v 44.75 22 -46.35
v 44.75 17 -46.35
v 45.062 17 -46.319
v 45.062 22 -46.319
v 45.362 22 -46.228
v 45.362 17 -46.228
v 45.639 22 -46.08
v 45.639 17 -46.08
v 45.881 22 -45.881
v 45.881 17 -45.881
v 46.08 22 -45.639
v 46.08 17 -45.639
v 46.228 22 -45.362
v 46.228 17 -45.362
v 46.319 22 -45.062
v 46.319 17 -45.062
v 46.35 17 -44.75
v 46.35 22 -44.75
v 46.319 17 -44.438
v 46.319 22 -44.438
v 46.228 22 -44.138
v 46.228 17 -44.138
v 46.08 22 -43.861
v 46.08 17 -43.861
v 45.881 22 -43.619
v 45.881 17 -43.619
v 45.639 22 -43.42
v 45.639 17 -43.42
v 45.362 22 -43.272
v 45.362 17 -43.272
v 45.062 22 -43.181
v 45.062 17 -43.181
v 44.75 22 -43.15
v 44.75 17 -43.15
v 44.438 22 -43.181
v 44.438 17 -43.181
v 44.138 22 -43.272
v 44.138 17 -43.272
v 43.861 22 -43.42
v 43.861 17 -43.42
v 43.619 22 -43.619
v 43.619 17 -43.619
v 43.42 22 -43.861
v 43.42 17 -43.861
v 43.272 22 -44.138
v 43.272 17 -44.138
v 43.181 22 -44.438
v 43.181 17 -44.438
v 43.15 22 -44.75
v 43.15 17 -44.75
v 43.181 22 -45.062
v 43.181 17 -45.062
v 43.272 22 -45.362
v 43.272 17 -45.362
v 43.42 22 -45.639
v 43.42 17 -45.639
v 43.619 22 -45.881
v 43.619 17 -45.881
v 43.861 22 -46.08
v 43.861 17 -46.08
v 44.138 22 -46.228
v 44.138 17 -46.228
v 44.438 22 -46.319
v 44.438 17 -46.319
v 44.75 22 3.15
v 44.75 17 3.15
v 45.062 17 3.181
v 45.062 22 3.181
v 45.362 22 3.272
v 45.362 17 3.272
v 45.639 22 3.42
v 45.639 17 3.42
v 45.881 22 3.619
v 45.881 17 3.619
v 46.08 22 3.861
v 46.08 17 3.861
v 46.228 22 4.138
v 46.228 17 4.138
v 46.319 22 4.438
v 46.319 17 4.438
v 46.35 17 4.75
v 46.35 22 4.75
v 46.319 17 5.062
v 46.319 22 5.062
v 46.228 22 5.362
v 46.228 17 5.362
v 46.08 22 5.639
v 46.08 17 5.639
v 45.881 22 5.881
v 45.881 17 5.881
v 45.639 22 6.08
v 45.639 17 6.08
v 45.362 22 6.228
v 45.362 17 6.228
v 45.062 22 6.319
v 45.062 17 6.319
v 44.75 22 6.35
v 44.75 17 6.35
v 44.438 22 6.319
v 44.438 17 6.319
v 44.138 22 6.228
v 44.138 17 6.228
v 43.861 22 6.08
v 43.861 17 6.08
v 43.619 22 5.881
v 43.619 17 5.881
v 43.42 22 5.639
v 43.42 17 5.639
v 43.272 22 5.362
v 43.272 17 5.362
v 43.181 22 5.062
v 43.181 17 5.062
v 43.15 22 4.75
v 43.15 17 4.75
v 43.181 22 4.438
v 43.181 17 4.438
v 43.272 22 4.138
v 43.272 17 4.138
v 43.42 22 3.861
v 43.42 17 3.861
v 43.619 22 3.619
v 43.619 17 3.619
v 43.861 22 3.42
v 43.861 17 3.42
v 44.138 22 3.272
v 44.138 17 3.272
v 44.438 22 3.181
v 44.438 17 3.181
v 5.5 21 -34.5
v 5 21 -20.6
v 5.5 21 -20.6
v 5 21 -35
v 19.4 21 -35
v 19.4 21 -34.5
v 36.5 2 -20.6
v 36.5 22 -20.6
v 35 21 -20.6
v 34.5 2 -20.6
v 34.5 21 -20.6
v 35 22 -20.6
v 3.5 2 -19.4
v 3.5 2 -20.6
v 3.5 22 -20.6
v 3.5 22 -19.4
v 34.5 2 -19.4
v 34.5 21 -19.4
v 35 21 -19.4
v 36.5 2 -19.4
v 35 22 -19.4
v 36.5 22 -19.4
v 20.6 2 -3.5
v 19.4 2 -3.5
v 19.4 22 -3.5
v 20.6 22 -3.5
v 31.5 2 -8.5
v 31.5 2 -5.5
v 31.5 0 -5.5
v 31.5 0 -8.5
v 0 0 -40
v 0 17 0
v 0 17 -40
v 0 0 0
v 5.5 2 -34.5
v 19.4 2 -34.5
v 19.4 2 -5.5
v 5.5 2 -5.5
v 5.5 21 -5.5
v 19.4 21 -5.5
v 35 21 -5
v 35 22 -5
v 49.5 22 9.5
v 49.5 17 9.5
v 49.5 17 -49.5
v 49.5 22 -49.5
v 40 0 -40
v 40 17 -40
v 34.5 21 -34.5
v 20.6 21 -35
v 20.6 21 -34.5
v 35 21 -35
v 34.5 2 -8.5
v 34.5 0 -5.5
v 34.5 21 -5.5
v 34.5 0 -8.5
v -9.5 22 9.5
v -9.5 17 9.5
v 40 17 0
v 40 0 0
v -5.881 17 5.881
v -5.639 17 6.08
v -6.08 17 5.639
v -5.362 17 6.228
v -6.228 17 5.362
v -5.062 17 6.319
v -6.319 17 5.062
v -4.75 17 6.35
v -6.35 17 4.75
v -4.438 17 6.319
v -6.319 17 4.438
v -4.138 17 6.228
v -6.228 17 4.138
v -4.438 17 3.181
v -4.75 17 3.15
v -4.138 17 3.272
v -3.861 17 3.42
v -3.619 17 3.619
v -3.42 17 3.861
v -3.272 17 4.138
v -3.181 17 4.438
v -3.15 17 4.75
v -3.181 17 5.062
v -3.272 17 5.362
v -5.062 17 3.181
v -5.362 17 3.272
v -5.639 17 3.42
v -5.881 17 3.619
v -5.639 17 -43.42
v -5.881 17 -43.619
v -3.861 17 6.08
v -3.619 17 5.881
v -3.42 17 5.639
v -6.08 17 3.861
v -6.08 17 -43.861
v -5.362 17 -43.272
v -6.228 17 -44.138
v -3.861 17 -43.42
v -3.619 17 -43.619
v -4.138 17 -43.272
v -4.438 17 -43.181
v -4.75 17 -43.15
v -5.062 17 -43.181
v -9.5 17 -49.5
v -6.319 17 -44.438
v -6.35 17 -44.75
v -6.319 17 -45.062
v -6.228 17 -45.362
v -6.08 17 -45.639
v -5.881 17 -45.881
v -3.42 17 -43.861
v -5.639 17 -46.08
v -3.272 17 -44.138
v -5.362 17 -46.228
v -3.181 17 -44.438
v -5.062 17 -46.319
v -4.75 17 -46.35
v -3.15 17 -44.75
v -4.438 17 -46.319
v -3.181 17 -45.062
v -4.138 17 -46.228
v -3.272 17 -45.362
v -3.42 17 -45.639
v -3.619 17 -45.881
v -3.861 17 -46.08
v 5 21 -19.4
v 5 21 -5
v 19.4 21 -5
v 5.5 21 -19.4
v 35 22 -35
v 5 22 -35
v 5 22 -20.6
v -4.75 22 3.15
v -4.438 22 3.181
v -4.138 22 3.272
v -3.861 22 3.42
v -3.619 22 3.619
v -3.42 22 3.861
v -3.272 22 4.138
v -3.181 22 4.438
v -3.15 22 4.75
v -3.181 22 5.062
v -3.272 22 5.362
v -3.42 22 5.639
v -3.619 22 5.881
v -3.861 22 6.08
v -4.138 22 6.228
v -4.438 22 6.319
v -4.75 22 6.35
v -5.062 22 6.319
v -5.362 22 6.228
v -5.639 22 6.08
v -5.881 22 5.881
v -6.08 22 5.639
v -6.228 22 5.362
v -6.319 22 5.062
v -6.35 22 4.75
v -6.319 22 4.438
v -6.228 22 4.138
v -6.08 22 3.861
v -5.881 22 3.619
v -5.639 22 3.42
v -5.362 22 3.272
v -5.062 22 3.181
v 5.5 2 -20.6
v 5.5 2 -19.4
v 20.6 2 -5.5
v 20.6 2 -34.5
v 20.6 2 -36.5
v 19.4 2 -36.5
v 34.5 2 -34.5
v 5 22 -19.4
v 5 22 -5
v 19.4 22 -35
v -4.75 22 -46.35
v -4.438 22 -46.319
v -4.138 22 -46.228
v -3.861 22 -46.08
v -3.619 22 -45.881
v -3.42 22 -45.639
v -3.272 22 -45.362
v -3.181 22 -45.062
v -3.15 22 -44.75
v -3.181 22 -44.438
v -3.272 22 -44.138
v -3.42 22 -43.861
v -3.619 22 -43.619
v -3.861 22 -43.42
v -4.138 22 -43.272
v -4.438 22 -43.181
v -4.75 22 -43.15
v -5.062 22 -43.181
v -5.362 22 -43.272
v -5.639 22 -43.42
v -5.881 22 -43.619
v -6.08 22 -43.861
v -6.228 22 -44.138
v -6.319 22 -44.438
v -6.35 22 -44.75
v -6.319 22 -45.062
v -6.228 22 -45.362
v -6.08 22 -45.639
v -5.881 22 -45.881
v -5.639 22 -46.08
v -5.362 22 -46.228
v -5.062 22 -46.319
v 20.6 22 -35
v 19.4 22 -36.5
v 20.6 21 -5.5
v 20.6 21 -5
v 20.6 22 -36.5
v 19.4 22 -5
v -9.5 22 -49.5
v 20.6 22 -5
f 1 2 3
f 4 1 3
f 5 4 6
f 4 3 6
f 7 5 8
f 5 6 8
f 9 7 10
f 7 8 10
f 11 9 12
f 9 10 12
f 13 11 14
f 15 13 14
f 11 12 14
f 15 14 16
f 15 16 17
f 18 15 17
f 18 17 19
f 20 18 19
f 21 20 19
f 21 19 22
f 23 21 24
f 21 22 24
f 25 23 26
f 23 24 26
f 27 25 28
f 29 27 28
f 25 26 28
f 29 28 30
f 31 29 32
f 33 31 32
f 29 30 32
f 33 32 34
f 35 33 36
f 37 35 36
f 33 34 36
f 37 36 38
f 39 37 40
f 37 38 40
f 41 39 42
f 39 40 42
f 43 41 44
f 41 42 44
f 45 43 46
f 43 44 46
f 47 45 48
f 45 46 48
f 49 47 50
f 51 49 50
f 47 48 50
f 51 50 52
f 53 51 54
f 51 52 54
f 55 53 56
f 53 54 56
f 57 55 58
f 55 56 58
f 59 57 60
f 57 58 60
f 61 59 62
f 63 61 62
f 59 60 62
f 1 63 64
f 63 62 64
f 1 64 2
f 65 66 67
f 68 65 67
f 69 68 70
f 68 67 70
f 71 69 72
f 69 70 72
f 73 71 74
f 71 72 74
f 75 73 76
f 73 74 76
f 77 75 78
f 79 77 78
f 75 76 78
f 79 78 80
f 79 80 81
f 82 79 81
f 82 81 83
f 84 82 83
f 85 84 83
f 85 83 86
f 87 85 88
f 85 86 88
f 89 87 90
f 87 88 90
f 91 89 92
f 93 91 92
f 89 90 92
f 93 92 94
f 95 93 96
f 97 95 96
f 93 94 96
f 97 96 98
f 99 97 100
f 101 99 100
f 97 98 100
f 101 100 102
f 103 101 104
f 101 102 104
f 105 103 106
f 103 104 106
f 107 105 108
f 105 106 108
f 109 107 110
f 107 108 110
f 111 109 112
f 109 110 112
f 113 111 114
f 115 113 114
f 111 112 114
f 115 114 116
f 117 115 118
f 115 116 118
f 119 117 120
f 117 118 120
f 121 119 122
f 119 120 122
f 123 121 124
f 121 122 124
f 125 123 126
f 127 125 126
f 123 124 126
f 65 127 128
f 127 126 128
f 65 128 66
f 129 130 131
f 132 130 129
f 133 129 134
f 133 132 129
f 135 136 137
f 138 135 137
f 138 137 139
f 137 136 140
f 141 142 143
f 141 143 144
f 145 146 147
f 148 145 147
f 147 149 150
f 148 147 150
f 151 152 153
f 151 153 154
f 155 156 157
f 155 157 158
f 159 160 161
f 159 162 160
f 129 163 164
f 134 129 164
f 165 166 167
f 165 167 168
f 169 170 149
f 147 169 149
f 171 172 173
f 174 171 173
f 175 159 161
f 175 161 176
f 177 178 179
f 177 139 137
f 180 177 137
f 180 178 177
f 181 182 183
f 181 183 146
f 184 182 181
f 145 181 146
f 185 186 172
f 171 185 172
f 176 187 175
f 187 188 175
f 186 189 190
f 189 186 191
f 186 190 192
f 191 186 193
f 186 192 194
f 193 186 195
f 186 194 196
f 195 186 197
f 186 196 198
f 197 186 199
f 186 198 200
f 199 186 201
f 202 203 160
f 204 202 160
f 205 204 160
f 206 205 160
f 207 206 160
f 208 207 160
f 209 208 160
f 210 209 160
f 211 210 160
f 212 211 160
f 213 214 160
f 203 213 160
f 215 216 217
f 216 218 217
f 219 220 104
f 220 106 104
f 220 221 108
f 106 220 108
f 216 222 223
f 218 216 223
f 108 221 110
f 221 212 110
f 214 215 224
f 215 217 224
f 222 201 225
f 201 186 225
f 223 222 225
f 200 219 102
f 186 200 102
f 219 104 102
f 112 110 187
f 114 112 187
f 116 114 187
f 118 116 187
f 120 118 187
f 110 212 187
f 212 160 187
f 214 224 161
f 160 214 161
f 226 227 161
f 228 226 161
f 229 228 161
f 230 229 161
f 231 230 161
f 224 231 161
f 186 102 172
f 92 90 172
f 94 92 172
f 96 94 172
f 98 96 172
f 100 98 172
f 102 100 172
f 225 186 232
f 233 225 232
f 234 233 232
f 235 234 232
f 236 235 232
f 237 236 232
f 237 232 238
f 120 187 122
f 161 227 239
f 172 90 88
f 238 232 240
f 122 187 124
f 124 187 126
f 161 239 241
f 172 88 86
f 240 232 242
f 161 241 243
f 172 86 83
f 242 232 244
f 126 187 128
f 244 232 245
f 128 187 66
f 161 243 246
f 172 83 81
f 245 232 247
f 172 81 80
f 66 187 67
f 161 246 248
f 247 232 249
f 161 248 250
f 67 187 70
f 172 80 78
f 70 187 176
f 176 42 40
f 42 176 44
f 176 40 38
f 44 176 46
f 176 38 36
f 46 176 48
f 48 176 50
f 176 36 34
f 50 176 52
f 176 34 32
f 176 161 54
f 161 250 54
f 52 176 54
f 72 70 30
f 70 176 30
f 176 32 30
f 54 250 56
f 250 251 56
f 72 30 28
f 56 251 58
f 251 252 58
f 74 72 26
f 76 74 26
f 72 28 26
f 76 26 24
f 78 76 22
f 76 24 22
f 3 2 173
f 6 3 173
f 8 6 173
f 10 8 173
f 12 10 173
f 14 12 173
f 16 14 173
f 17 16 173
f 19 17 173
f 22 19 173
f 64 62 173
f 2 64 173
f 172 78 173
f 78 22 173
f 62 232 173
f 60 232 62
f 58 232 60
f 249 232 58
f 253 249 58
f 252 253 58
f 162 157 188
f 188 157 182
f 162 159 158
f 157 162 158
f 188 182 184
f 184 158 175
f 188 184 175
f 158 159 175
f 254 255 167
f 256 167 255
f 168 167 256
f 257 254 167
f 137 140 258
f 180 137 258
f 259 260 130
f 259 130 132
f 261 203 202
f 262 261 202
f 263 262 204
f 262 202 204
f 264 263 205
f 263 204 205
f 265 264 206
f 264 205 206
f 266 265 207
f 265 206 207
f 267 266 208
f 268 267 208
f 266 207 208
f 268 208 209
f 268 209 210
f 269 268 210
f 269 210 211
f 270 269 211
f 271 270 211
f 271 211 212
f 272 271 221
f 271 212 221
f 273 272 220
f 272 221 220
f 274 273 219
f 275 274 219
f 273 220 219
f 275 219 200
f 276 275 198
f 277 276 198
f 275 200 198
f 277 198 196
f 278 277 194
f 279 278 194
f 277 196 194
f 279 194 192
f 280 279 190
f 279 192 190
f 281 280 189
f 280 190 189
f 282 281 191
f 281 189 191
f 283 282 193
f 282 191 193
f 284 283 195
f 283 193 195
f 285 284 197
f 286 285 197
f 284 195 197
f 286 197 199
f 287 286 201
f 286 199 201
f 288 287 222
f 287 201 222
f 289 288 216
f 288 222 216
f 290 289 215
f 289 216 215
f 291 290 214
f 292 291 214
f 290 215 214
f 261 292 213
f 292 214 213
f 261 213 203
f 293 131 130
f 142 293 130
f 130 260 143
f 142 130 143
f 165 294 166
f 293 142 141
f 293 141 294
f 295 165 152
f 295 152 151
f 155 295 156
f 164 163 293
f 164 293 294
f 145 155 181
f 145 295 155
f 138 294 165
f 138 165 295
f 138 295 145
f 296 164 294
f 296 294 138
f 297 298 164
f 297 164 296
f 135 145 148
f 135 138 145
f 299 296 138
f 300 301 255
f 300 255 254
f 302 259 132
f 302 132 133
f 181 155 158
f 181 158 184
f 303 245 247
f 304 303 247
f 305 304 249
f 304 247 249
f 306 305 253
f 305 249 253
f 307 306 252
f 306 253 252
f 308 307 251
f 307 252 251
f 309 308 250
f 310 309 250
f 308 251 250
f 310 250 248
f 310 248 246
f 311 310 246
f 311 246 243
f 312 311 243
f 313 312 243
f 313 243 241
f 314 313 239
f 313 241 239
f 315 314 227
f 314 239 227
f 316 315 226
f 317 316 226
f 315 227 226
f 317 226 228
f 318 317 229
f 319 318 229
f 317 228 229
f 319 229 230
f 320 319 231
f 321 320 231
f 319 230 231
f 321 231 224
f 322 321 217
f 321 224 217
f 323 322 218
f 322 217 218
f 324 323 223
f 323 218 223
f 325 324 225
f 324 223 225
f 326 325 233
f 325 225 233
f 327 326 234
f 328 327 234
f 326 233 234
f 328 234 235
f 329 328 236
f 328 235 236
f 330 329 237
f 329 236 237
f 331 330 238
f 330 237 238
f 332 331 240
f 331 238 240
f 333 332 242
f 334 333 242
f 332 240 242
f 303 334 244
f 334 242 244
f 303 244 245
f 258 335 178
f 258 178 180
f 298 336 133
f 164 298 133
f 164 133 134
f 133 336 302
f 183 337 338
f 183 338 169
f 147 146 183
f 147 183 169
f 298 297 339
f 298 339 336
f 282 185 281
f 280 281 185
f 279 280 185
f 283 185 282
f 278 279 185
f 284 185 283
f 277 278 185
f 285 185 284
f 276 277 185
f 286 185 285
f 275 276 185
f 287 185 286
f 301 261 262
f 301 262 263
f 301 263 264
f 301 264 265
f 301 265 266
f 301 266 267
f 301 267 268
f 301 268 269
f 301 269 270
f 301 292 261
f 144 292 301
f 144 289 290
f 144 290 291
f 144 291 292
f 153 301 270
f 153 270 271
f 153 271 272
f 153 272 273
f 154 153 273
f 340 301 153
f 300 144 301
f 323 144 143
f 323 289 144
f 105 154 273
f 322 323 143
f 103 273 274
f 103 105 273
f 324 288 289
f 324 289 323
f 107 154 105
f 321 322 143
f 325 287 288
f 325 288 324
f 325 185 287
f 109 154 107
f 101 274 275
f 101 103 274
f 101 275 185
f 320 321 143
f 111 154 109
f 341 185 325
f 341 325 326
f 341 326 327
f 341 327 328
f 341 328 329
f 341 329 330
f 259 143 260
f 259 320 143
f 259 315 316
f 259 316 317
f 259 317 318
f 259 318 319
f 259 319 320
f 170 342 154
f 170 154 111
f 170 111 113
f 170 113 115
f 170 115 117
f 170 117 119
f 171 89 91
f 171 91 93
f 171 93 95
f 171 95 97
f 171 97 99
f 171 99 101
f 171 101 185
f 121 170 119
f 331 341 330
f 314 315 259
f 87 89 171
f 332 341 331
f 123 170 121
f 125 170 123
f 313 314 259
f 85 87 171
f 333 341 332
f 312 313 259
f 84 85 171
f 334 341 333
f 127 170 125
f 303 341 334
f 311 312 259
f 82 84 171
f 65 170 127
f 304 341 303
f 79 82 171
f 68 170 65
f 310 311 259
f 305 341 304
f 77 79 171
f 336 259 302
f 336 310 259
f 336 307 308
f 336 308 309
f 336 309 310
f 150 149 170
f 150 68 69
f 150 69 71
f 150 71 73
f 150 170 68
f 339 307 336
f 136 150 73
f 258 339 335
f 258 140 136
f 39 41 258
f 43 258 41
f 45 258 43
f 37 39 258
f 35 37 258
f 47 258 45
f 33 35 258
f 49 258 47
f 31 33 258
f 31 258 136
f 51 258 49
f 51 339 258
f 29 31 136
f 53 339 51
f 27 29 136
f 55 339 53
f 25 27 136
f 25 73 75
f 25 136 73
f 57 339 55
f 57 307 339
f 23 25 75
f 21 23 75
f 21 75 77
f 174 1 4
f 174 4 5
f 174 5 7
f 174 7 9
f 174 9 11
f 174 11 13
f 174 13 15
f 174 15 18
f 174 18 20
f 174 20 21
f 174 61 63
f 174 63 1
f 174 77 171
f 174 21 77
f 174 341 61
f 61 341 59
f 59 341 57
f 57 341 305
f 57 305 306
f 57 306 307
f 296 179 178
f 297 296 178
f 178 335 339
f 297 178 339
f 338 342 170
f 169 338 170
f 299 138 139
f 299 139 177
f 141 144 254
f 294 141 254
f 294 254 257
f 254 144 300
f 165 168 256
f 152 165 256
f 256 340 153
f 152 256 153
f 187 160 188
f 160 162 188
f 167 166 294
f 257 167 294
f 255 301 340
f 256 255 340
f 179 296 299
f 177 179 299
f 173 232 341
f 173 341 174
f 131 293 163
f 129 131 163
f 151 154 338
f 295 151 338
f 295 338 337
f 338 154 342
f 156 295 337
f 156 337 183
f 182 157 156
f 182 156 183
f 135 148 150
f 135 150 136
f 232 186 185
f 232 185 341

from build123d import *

# Parameters (mm, degrees)
CROQUIS1_W              = 40
CROQUIS1_H              = 40
SALIENTE_EXTRUIR1_DEPTH = 2
CROQUIS2_W              = 40
CROQUIS2_H              = 40
CROQUIS2_W_2            = 29
CROQUIS2_H_2            = 29
SALIENTE_EXTRUIR2_DEPTH = 15
CROQUIS3_W              = 59
CROQUIS3_H              = 59
CROQUIS3_W_2            = 29
CROQUIS3_H_2            = 29
SALIENTE_EXTRUIR3_DEPTH = 5
CORTAR_EXTRUIR1_DEPTH   = 20
CROQUIS5_R              = 1.6
CORTAR_EXTRUIR2_DEPTH   = 5
CROQUIS6_W              = 30
CROQUIS6_H              = 30
CORTAR_EXTRUIR3_DEPTH   = 1
CROQUIS7_W              = 3
CROQUIS7_H              = 3
CORTAR_EXTRUIR4_DEPTH   = 5


with BuildPart() as part:
    # Croquis1 → Saliente-Extruir1 (new body)
    with BuildSketch(Plane(origin=(0, 0, 0), x_dir=(1, 0, 0), z_dir=(0, 1, 0))):
        with Locations((20, 20)):
            Rectangle(CROQUIS1_W, CROQUIS1_H)
    extrude(amount=SALIENTE_EXTRUIR1_DEPTH)

    # Croquis2 → Saliente-Extruir2 (add)
    with BuildSketch(Plane(origin=(0, 2, 0), x_dir=(1, 0, 0), z_dir=(0, 1, 0))):
        with Locations((20, 20)):
            Rectangle(CROQUIS2_W, CROQUIS2_H)
        with Locations((20, 20)):
            Rectangle(CROQUIS2_W_2, CROQUIS2_H_2, mode=Mode.SUBTRACT)
    extrude(amount=SALIENTE_EXTRUIR2_DEPTH)

    # Croquis3 → Saliente-Extruir3 (add)
    with BuildSketch(Plane(origin=(0, 17, 0), x_dir=(1, 0, 0), z_dir=(0, 1, 0))):
        with Locations((20, 20)):
            Rectangle(CROQUIS3_W, CROQUIS3_H)
        with Locations((20, 20)):
            Rectangle(CROQUIS3_W_2, CROQUIS3_H_2, mode=Mode.SUBTRACT)
    extrude(amount=SALIENTE_EXTRUIR3_DEPTH)

    # Croquis4 → Cortar-Extruir1 (cut)
    with BuildSketch(Plane(origin=(0, 22, 0), x_dir=(1, 0, 0), z_dir=(0, 1, 0))):
        Polygon((19.4, 5.5), (19.4, 3.5), (20.6, 3.5), (20.6, 5.5), (34.5, 5.5), (34.5, 19.4), (36.5, 19.4), (36.5, 20.6), (34.5, 20.6), (34.5, 34.5), (20.6, 34.5), (20.6, 36.5), (19.4, 36.5), (19.4, 34.5), (5.5, 34.5), (5.5, 20.6), (3.5, 20.6), (3.5, 19.4), (5.5, 19.4), (5.5, 5.5), align=None)
    extrude(amount=-CORTAR_EXTRUIR1_DEPTH, mode=Mode.SUBTRACT)

    # Croquis5 → Cortar-Extruir2 (cut)
    with BuildSketch(Plane.XZ.offset(-17)):
        with Locations(Location((-4.75, 4.75, 0), (0, 0, 270))):
            Circle(CROQUIS5_R)
        with Locations(Location((44.75, 4.75, 0), (0, 0, 270))):
            Circle(CROQUIS5_R)
        with Locations(Location((44.75, -44.75, 0), (0, 0, 270))):
            Circle(CROQUIS5_R)
        with Locations(Location((-4.75, -44.75, 0), (0, 0, 270))):
            Circle(CROQUIS5_R)
    extrude(amount=-CORTAR_EXTRUIR2_DEPTH, mode=Mode.SUBTRACT)

    # Croquis6 → Cortar-Extruir3 (cut)
    with BuildSketch(Plane(origin=(0, 22, 0), x_dir=(1, 0, 0), z_dir=(0, 1, 0))):
        with Locations((20, 20)):
            Rectangle(CROQUIS6_W, CROQUIS6_H)
    extrude(amount=-CORTAR_EXTRUIR3_DEPTH, mode=Mode.SUBTRACT)

    # Croquis7 → Cortar-Extruir4 (cut)
    with BuildSketch(Plane(origin=(0, 2, 0), x_dir=(1, 0, 0), z_dir=(0, 1, 0))):
        with Locations((33, 7)):
            Rectangle(CROQUIS7_W, CROQUIS7_H)
    extrude(amount=-CORTAR_EXTRUIR4_DEPTH, mode=Mode.SUBTRACT)


solid = part.part
